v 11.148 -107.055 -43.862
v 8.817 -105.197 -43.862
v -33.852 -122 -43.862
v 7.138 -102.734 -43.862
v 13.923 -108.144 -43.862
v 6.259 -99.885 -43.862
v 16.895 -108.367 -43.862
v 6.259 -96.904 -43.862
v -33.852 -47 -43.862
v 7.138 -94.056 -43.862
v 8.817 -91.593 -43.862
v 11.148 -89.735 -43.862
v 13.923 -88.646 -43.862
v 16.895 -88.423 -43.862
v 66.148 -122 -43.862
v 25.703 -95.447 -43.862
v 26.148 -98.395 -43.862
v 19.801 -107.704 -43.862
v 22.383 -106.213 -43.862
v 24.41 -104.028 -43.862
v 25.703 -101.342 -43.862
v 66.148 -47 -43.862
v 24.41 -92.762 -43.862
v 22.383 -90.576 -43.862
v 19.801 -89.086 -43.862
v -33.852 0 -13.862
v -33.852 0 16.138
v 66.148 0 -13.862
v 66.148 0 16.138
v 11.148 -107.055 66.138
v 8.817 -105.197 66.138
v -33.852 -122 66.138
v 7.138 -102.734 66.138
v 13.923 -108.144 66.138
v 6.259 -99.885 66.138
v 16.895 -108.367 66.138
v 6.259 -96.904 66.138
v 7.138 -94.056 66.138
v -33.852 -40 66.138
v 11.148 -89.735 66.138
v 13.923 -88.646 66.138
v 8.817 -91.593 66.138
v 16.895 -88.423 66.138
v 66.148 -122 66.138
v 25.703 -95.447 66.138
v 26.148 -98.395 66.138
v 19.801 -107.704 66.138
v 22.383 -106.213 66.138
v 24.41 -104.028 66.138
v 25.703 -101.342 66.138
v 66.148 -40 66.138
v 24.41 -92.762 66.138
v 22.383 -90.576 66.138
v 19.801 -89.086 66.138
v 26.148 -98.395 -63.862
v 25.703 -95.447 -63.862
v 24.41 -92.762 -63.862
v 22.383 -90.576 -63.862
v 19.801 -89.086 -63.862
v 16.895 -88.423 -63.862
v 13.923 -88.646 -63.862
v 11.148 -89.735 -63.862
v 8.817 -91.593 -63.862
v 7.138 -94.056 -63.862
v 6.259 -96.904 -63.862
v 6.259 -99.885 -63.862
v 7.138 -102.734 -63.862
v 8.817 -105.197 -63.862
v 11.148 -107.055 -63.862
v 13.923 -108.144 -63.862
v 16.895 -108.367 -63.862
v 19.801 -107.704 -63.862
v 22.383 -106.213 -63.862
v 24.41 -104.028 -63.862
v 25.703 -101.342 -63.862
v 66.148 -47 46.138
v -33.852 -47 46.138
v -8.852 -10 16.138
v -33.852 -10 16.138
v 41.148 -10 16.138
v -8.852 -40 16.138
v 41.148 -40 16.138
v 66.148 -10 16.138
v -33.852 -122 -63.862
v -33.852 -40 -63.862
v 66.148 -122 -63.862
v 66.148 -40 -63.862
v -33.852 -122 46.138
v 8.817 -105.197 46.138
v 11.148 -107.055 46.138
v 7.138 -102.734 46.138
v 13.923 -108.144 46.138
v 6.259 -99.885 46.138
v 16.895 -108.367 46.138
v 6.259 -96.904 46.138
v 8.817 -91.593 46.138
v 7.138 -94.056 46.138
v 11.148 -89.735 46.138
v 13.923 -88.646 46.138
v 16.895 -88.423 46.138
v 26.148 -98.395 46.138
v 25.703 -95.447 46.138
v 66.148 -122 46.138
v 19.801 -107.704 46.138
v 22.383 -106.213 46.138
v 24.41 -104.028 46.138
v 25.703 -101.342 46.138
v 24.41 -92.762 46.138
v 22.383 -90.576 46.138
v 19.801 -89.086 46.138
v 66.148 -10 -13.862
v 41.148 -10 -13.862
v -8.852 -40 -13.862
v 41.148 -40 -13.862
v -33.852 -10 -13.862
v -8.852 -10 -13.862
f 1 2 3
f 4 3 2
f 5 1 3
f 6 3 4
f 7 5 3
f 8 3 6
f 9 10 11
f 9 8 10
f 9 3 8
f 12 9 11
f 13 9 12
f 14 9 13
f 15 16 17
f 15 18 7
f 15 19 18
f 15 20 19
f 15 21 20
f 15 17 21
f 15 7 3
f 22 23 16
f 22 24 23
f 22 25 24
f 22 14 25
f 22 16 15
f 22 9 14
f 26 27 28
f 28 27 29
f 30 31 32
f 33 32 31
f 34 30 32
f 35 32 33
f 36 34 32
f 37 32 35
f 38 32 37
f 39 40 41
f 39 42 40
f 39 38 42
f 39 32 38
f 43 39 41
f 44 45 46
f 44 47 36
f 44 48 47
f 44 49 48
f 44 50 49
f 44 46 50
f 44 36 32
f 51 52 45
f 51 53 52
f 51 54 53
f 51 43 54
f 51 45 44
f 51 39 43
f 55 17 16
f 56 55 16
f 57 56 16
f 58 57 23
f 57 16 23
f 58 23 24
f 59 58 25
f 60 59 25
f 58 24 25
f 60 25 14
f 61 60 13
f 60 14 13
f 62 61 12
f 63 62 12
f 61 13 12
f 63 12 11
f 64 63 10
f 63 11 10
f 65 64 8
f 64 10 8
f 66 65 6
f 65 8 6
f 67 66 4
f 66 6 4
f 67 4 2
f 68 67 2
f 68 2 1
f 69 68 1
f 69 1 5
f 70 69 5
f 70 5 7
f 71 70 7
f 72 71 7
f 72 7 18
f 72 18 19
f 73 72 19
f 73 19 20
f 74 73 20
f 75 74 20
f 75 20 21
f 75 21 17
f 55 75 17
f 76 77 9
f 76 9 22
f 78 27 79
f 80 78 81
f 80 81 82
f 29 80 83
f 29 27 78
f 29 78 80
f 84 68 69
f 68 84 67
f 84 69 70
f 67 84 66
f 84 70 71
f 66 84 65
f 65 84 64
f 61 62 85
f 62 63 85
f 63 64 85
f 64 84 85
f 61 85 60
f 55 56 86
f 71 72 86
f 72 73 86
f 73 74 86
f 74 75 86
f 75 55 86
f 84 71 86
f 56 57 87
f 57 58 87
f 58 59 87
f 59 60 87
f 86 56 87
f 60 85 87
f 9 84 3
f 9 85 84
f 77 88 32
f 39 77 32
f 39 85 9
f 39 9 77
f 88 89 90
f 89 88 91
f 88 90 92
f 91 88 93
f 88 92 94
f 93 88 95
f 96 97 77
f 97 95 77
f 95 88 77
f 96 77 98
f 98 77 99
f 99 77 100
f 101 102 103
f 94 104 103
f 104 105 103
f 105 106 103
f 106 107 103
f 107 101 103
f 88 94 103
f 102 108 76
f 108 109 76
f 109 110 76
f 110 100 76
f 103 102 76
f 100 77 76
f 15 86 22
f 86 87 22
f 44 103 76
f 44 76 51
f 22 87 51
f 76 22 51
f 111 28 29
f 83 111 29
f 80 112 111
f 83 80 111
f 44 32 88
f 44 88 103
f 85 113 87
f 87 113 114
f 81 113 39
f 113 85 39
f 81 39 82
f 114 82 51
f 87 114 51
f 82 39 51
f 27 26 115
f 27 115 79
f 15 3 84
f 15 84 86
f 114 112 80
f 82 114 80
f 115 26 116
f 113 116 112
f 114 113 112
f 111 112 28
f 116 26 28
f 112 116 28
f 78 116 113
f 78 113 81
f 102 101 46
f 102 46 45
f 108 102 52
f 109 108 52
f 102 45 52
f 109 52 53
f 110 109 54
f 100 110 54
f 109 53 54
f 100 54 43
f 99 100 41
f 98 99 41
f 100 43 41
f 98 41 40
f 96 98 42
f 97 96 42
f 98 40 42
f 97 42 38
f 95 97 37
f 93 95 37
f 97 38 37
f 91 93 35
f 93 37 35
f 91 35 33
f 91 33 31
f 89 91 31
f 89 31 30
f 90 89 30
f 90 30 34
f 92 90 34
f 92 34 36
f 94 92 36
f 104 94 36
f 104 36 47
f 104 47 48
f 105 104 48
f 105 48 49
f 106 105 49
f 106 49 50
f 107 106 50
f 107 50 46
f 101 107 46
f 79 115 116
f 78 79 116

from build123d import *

# Parameters (mm, degrees)
F0_W     = 100
F0_H     = 30
F1_DEPTH = 10
F2_W     = 50
F2_H     = 30
F3_DEPTH = 30
F4_W     = 100
F4_H     = 130
F4_W_2   = 50
F4_H_2   = 30
F5_DEPTH = 7
F6_W     = 100
F6_H     = 20
F7_DEPTH = 75
F8_R     = 10
F9_DEPTH = 130.001


with BuildPart() as f1:
    # F0 (on Front) → F1 (new body)
    with BuildSketch(Plane.XZ):
        with Locations((16.147754, 1.13822)):
            Rectangle(F0_W, F0_H)
    extrude(amount=F1_DEPTH)

    # F2 (on face) → F3 (join)
    with BuildSketch(Plane.XZ.offset(10)):
        with Locations((16.147754, 1.13822)):
            Rectangle(F2_W, F2_H)
    extrude(amount=F3_DEPTH)

    # F4 (on face) → F5 (join)
    with BuildSketch(Plane.XZ.offset(40)):
        with Locations((16.147754, 1.13822)):
            Rectangle(F4_W, F4_H)
        with Locations((16.147754, 1.13822)):
            Rectangle(F4_W_2, F4_H_2, mode=Mode.SUBTRACT)
        with Locations((16.147754, 1.13822)):
            Rectangle(F4_W_2, F4_H_2)
    extrude(amount=F5_DEPTH)

    # F6 (on face) → F7 (join)
    with BuildSketch(Plane.XZ.offset(47)):
        with Locations((16.147754, -53.86178)):
            Rectangle(F6_W, F6_H)
        with Locations((16.147754, 56.13822)):
            Rectangle(F6_W, F6_H)
    extrude(amount=F7_DEPTH)

    # F8 (on face) → F9 (cut, through all)
    with BuildSketch(Plane.XY.offset(66.13822)):
        with Locations((16.147754, -98.394804)):
            Circle(F8_R)
    extrude(amount=-F9_DEPTH, mode=Mode.SUBTRACT)


solid = f1.part
